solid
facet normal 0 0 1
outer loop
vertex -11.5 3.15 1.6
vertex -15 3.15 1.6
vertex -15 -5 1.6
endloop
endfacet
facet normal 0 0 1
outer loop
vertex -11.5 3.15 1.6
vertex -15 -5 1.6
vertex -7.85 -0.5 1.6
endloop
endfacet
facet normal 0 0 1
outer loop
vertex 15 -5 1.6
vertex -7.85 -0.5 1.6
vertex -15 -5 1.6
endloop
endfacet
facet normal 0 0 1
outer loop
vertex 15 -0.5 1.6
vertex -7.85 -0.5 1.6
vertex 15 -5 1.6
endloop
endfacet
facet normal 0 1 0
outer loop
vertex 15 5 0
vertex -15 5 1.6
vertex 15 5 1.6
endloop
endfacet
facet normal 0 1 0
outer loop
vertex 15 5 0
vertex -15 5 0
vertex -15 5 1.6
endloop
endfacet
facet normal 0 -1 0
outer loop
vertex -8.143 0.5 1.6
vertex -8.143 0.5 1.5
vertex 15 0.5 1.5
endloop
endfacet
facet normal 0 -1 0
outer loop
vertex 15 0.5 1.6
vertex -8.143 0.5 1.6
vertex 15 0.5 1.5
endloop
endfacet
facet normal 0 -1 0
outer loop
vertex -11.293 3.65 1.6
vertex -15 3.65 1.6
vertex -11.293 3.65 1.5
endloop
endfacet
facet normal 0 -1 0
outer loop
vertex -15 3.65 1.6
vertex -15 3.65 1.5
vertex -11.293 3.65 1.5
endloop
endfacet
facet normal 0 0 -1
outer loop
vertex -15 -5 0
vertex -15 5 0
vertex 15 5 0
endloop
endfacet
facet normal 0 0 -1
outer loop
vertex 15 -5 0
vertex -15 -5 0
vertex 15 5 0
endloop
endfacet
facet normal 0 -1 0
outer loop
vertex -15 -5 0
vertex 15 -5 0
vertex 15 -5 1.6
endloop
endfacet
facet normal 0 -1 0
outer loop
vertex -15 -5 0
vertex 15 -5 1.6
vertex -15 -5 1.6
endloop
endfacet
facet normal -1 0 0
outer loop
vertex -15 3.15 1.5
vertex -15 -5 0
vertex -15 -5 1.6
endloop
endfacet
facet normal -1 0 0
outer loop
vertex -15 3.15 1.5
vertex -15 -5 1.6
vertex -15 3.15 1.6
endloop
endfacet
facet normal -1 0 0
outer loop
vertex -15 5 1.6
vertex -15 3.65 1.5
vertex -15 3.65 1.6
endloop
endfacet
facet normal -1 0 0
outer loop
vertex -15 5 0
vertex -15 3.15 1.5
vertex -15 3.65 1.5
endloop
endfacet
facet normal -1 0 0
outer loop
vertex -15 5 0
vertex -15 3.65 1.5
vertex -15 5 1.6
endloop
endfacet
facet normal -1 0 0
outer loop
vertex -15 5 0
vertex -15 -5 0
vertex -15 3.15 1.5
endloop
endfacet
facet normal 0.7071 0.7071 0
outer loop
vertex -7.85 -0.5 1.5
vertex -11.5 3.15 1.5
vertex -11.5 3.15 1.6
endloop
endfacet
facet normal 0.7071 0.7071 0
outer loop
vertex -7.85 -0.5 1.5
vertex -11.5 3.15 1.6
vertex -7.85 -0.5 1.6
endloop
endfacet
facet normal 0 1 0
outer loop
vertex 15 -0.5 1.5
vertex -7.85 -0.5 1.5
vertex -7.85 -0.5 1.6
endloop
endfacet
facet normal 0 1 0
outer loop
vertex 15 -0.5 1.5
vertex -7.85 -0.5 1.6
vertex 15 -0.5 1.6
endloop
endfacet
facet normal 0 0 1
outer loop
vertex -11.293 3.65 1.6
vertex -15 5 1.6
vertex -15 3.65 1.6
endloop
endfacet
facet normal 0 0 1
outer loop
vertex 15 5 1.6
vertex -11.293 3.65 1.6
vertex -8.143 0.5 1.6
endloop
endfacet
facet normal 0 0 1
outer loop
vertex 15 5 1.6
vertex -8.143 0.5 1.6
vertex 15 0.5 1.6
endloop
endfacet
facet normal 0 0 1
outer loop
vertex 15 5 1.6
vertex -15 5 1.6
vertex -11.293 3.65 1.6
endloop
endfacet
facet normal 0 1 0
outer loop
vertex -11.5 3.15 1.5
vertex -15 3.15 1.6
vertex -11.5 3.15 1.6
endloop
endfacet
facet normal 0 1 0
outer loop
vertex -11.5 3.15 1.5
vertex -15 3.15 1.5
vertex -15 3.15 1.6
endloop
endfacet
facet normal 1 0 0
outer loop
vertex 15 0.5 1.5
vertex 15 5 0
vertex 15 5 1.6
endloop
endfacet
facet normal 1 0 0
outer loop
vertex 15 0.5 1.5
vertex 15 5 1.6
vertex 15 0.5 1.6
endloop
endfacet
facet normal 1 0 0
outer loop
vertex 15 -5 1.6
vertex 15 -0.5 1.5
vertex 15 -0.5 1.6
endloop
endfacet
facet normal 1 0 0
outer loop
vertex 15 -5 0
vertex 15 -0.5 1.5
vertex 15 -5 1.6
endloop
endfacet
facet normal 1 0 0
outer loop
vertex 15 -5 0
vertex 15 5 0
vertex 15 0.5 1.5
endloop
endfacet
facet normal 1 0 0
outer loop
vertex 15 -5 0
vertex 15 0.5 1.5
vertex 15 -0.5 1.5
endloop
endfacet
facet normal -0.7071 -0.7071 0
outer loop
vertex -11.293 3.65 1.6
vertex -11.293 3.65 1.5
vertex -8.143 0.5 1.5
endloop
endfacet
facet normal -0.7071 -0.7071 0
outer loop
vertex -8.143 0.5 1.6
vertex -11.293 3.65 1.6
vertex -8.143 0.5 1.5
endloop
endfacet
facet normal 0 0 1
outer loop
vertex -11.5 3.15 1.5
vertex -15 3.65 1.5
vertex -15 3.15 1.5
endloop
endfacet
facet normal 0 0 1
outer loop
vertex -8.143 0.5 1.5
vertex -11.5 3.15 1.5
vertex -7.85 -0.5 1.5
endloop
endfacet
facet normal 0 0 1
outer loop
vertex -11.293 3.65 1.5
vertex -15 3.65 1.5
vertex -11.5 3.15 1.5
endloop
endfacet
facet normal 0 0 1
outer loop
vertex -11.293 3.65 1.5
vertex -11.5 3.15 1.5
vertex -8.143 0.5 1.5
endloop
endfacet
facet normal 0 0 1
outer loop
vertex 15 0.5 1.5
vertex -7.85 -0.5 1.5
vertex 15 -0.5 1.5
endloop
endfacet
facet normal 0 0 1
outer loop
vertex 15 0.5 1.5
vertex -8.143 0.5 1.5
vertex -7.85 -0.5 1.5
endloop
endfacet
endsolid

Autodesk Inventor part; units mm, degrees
ref_plane "YZ Plane" through (0, 0, 0) normal (1, 0, 0) x (0, 1, 0)
ref_plane "XZ Plane" through (0, 0, 0) normal (0, 1, 0) x (-1, 0, 0)
ref_plane "XY Plane" through (0, 0, 0) normal (0, 0, 1) x (1, 0, 0)
sketch "Sketch1" plane through (0, 0, 0) normal (0, 0, 1) x (1, 0, 0)
  line L0 (-15, 5) -> (15, 5)
  line L1 (15, 5) -> (15, -5)
  line L2 (15, -5) -> (-15, -5)
  line L3 (-15, -5) -> (-15, 5)
  point P0 (0, 0)
  dimension "d0" = 30
  dimension "d1" = 10
  dimension "d10" = 5
  dimension "d11" = 15
extrude "Extrusion1" add sketch "Sketch1" along normal blind 1.5
sketch "Sketch2" plane through (0, 0, 1.5) normal (0, 0, 1) x (1, 0, 0)
  line L0 (15, 5) -> (-15, 5) projected
  line L1 (-15, 5) -> (-15, -5) projected
  line L2 (-15, -5) -> (15, -5) projected
  line L3 (15, -5) -> (15, 5) projected
  line L4 (-15, 5) -> (-15, -5) projected
  line L5 (-15, 3.65) -> (-11.2929, 3.65)
  line L6 (-15, 3.15) -> (-11.5, 3.15)
  line L7 (-11.5, 3.15) -> (-7.85, -0.5)
  line L8 (-11.5, 3.15) -> (-4.55, 3.15) construction
  line L9 (15, -5) -> (15, 5) projected
  line L10 (-7.85, -0.5) -> (15, -0.5)
  line L11 (-8.1429, 0.5) -> (15, 0.5)
  line L12 (-11.2929, 3.65) -> (-8.1429, 0.5)
  point P0 (0, 0)
  point P1 (-15, 3.4)
  dimension "d4" = 1.6
  dimension "d5" = 0.25
  dimension "d6" = 0.25
  dimension "d8" = 10
  dimension "d13" = 45
  dimension "d14" = 3.5
  dimension "d17" = 0.5
extrude "Extrusion2" add sketch "Sketch2" along normal blind 0.1 contours L3 L11 L12 L5 L1 L0 | L3 L2 L1 L6 L7 L10
equation "\"d10\" = 0.5 * d1"
equation "\"d11\" = 0.5 * d0"
equation "\"d6\" = d5"
equation "\"d17\" = d16"
equation "\"d16\" = 0.5"
properties part number "CNCM_FR4_Measurement_Rail_Contacts" material "Polypropylene"
